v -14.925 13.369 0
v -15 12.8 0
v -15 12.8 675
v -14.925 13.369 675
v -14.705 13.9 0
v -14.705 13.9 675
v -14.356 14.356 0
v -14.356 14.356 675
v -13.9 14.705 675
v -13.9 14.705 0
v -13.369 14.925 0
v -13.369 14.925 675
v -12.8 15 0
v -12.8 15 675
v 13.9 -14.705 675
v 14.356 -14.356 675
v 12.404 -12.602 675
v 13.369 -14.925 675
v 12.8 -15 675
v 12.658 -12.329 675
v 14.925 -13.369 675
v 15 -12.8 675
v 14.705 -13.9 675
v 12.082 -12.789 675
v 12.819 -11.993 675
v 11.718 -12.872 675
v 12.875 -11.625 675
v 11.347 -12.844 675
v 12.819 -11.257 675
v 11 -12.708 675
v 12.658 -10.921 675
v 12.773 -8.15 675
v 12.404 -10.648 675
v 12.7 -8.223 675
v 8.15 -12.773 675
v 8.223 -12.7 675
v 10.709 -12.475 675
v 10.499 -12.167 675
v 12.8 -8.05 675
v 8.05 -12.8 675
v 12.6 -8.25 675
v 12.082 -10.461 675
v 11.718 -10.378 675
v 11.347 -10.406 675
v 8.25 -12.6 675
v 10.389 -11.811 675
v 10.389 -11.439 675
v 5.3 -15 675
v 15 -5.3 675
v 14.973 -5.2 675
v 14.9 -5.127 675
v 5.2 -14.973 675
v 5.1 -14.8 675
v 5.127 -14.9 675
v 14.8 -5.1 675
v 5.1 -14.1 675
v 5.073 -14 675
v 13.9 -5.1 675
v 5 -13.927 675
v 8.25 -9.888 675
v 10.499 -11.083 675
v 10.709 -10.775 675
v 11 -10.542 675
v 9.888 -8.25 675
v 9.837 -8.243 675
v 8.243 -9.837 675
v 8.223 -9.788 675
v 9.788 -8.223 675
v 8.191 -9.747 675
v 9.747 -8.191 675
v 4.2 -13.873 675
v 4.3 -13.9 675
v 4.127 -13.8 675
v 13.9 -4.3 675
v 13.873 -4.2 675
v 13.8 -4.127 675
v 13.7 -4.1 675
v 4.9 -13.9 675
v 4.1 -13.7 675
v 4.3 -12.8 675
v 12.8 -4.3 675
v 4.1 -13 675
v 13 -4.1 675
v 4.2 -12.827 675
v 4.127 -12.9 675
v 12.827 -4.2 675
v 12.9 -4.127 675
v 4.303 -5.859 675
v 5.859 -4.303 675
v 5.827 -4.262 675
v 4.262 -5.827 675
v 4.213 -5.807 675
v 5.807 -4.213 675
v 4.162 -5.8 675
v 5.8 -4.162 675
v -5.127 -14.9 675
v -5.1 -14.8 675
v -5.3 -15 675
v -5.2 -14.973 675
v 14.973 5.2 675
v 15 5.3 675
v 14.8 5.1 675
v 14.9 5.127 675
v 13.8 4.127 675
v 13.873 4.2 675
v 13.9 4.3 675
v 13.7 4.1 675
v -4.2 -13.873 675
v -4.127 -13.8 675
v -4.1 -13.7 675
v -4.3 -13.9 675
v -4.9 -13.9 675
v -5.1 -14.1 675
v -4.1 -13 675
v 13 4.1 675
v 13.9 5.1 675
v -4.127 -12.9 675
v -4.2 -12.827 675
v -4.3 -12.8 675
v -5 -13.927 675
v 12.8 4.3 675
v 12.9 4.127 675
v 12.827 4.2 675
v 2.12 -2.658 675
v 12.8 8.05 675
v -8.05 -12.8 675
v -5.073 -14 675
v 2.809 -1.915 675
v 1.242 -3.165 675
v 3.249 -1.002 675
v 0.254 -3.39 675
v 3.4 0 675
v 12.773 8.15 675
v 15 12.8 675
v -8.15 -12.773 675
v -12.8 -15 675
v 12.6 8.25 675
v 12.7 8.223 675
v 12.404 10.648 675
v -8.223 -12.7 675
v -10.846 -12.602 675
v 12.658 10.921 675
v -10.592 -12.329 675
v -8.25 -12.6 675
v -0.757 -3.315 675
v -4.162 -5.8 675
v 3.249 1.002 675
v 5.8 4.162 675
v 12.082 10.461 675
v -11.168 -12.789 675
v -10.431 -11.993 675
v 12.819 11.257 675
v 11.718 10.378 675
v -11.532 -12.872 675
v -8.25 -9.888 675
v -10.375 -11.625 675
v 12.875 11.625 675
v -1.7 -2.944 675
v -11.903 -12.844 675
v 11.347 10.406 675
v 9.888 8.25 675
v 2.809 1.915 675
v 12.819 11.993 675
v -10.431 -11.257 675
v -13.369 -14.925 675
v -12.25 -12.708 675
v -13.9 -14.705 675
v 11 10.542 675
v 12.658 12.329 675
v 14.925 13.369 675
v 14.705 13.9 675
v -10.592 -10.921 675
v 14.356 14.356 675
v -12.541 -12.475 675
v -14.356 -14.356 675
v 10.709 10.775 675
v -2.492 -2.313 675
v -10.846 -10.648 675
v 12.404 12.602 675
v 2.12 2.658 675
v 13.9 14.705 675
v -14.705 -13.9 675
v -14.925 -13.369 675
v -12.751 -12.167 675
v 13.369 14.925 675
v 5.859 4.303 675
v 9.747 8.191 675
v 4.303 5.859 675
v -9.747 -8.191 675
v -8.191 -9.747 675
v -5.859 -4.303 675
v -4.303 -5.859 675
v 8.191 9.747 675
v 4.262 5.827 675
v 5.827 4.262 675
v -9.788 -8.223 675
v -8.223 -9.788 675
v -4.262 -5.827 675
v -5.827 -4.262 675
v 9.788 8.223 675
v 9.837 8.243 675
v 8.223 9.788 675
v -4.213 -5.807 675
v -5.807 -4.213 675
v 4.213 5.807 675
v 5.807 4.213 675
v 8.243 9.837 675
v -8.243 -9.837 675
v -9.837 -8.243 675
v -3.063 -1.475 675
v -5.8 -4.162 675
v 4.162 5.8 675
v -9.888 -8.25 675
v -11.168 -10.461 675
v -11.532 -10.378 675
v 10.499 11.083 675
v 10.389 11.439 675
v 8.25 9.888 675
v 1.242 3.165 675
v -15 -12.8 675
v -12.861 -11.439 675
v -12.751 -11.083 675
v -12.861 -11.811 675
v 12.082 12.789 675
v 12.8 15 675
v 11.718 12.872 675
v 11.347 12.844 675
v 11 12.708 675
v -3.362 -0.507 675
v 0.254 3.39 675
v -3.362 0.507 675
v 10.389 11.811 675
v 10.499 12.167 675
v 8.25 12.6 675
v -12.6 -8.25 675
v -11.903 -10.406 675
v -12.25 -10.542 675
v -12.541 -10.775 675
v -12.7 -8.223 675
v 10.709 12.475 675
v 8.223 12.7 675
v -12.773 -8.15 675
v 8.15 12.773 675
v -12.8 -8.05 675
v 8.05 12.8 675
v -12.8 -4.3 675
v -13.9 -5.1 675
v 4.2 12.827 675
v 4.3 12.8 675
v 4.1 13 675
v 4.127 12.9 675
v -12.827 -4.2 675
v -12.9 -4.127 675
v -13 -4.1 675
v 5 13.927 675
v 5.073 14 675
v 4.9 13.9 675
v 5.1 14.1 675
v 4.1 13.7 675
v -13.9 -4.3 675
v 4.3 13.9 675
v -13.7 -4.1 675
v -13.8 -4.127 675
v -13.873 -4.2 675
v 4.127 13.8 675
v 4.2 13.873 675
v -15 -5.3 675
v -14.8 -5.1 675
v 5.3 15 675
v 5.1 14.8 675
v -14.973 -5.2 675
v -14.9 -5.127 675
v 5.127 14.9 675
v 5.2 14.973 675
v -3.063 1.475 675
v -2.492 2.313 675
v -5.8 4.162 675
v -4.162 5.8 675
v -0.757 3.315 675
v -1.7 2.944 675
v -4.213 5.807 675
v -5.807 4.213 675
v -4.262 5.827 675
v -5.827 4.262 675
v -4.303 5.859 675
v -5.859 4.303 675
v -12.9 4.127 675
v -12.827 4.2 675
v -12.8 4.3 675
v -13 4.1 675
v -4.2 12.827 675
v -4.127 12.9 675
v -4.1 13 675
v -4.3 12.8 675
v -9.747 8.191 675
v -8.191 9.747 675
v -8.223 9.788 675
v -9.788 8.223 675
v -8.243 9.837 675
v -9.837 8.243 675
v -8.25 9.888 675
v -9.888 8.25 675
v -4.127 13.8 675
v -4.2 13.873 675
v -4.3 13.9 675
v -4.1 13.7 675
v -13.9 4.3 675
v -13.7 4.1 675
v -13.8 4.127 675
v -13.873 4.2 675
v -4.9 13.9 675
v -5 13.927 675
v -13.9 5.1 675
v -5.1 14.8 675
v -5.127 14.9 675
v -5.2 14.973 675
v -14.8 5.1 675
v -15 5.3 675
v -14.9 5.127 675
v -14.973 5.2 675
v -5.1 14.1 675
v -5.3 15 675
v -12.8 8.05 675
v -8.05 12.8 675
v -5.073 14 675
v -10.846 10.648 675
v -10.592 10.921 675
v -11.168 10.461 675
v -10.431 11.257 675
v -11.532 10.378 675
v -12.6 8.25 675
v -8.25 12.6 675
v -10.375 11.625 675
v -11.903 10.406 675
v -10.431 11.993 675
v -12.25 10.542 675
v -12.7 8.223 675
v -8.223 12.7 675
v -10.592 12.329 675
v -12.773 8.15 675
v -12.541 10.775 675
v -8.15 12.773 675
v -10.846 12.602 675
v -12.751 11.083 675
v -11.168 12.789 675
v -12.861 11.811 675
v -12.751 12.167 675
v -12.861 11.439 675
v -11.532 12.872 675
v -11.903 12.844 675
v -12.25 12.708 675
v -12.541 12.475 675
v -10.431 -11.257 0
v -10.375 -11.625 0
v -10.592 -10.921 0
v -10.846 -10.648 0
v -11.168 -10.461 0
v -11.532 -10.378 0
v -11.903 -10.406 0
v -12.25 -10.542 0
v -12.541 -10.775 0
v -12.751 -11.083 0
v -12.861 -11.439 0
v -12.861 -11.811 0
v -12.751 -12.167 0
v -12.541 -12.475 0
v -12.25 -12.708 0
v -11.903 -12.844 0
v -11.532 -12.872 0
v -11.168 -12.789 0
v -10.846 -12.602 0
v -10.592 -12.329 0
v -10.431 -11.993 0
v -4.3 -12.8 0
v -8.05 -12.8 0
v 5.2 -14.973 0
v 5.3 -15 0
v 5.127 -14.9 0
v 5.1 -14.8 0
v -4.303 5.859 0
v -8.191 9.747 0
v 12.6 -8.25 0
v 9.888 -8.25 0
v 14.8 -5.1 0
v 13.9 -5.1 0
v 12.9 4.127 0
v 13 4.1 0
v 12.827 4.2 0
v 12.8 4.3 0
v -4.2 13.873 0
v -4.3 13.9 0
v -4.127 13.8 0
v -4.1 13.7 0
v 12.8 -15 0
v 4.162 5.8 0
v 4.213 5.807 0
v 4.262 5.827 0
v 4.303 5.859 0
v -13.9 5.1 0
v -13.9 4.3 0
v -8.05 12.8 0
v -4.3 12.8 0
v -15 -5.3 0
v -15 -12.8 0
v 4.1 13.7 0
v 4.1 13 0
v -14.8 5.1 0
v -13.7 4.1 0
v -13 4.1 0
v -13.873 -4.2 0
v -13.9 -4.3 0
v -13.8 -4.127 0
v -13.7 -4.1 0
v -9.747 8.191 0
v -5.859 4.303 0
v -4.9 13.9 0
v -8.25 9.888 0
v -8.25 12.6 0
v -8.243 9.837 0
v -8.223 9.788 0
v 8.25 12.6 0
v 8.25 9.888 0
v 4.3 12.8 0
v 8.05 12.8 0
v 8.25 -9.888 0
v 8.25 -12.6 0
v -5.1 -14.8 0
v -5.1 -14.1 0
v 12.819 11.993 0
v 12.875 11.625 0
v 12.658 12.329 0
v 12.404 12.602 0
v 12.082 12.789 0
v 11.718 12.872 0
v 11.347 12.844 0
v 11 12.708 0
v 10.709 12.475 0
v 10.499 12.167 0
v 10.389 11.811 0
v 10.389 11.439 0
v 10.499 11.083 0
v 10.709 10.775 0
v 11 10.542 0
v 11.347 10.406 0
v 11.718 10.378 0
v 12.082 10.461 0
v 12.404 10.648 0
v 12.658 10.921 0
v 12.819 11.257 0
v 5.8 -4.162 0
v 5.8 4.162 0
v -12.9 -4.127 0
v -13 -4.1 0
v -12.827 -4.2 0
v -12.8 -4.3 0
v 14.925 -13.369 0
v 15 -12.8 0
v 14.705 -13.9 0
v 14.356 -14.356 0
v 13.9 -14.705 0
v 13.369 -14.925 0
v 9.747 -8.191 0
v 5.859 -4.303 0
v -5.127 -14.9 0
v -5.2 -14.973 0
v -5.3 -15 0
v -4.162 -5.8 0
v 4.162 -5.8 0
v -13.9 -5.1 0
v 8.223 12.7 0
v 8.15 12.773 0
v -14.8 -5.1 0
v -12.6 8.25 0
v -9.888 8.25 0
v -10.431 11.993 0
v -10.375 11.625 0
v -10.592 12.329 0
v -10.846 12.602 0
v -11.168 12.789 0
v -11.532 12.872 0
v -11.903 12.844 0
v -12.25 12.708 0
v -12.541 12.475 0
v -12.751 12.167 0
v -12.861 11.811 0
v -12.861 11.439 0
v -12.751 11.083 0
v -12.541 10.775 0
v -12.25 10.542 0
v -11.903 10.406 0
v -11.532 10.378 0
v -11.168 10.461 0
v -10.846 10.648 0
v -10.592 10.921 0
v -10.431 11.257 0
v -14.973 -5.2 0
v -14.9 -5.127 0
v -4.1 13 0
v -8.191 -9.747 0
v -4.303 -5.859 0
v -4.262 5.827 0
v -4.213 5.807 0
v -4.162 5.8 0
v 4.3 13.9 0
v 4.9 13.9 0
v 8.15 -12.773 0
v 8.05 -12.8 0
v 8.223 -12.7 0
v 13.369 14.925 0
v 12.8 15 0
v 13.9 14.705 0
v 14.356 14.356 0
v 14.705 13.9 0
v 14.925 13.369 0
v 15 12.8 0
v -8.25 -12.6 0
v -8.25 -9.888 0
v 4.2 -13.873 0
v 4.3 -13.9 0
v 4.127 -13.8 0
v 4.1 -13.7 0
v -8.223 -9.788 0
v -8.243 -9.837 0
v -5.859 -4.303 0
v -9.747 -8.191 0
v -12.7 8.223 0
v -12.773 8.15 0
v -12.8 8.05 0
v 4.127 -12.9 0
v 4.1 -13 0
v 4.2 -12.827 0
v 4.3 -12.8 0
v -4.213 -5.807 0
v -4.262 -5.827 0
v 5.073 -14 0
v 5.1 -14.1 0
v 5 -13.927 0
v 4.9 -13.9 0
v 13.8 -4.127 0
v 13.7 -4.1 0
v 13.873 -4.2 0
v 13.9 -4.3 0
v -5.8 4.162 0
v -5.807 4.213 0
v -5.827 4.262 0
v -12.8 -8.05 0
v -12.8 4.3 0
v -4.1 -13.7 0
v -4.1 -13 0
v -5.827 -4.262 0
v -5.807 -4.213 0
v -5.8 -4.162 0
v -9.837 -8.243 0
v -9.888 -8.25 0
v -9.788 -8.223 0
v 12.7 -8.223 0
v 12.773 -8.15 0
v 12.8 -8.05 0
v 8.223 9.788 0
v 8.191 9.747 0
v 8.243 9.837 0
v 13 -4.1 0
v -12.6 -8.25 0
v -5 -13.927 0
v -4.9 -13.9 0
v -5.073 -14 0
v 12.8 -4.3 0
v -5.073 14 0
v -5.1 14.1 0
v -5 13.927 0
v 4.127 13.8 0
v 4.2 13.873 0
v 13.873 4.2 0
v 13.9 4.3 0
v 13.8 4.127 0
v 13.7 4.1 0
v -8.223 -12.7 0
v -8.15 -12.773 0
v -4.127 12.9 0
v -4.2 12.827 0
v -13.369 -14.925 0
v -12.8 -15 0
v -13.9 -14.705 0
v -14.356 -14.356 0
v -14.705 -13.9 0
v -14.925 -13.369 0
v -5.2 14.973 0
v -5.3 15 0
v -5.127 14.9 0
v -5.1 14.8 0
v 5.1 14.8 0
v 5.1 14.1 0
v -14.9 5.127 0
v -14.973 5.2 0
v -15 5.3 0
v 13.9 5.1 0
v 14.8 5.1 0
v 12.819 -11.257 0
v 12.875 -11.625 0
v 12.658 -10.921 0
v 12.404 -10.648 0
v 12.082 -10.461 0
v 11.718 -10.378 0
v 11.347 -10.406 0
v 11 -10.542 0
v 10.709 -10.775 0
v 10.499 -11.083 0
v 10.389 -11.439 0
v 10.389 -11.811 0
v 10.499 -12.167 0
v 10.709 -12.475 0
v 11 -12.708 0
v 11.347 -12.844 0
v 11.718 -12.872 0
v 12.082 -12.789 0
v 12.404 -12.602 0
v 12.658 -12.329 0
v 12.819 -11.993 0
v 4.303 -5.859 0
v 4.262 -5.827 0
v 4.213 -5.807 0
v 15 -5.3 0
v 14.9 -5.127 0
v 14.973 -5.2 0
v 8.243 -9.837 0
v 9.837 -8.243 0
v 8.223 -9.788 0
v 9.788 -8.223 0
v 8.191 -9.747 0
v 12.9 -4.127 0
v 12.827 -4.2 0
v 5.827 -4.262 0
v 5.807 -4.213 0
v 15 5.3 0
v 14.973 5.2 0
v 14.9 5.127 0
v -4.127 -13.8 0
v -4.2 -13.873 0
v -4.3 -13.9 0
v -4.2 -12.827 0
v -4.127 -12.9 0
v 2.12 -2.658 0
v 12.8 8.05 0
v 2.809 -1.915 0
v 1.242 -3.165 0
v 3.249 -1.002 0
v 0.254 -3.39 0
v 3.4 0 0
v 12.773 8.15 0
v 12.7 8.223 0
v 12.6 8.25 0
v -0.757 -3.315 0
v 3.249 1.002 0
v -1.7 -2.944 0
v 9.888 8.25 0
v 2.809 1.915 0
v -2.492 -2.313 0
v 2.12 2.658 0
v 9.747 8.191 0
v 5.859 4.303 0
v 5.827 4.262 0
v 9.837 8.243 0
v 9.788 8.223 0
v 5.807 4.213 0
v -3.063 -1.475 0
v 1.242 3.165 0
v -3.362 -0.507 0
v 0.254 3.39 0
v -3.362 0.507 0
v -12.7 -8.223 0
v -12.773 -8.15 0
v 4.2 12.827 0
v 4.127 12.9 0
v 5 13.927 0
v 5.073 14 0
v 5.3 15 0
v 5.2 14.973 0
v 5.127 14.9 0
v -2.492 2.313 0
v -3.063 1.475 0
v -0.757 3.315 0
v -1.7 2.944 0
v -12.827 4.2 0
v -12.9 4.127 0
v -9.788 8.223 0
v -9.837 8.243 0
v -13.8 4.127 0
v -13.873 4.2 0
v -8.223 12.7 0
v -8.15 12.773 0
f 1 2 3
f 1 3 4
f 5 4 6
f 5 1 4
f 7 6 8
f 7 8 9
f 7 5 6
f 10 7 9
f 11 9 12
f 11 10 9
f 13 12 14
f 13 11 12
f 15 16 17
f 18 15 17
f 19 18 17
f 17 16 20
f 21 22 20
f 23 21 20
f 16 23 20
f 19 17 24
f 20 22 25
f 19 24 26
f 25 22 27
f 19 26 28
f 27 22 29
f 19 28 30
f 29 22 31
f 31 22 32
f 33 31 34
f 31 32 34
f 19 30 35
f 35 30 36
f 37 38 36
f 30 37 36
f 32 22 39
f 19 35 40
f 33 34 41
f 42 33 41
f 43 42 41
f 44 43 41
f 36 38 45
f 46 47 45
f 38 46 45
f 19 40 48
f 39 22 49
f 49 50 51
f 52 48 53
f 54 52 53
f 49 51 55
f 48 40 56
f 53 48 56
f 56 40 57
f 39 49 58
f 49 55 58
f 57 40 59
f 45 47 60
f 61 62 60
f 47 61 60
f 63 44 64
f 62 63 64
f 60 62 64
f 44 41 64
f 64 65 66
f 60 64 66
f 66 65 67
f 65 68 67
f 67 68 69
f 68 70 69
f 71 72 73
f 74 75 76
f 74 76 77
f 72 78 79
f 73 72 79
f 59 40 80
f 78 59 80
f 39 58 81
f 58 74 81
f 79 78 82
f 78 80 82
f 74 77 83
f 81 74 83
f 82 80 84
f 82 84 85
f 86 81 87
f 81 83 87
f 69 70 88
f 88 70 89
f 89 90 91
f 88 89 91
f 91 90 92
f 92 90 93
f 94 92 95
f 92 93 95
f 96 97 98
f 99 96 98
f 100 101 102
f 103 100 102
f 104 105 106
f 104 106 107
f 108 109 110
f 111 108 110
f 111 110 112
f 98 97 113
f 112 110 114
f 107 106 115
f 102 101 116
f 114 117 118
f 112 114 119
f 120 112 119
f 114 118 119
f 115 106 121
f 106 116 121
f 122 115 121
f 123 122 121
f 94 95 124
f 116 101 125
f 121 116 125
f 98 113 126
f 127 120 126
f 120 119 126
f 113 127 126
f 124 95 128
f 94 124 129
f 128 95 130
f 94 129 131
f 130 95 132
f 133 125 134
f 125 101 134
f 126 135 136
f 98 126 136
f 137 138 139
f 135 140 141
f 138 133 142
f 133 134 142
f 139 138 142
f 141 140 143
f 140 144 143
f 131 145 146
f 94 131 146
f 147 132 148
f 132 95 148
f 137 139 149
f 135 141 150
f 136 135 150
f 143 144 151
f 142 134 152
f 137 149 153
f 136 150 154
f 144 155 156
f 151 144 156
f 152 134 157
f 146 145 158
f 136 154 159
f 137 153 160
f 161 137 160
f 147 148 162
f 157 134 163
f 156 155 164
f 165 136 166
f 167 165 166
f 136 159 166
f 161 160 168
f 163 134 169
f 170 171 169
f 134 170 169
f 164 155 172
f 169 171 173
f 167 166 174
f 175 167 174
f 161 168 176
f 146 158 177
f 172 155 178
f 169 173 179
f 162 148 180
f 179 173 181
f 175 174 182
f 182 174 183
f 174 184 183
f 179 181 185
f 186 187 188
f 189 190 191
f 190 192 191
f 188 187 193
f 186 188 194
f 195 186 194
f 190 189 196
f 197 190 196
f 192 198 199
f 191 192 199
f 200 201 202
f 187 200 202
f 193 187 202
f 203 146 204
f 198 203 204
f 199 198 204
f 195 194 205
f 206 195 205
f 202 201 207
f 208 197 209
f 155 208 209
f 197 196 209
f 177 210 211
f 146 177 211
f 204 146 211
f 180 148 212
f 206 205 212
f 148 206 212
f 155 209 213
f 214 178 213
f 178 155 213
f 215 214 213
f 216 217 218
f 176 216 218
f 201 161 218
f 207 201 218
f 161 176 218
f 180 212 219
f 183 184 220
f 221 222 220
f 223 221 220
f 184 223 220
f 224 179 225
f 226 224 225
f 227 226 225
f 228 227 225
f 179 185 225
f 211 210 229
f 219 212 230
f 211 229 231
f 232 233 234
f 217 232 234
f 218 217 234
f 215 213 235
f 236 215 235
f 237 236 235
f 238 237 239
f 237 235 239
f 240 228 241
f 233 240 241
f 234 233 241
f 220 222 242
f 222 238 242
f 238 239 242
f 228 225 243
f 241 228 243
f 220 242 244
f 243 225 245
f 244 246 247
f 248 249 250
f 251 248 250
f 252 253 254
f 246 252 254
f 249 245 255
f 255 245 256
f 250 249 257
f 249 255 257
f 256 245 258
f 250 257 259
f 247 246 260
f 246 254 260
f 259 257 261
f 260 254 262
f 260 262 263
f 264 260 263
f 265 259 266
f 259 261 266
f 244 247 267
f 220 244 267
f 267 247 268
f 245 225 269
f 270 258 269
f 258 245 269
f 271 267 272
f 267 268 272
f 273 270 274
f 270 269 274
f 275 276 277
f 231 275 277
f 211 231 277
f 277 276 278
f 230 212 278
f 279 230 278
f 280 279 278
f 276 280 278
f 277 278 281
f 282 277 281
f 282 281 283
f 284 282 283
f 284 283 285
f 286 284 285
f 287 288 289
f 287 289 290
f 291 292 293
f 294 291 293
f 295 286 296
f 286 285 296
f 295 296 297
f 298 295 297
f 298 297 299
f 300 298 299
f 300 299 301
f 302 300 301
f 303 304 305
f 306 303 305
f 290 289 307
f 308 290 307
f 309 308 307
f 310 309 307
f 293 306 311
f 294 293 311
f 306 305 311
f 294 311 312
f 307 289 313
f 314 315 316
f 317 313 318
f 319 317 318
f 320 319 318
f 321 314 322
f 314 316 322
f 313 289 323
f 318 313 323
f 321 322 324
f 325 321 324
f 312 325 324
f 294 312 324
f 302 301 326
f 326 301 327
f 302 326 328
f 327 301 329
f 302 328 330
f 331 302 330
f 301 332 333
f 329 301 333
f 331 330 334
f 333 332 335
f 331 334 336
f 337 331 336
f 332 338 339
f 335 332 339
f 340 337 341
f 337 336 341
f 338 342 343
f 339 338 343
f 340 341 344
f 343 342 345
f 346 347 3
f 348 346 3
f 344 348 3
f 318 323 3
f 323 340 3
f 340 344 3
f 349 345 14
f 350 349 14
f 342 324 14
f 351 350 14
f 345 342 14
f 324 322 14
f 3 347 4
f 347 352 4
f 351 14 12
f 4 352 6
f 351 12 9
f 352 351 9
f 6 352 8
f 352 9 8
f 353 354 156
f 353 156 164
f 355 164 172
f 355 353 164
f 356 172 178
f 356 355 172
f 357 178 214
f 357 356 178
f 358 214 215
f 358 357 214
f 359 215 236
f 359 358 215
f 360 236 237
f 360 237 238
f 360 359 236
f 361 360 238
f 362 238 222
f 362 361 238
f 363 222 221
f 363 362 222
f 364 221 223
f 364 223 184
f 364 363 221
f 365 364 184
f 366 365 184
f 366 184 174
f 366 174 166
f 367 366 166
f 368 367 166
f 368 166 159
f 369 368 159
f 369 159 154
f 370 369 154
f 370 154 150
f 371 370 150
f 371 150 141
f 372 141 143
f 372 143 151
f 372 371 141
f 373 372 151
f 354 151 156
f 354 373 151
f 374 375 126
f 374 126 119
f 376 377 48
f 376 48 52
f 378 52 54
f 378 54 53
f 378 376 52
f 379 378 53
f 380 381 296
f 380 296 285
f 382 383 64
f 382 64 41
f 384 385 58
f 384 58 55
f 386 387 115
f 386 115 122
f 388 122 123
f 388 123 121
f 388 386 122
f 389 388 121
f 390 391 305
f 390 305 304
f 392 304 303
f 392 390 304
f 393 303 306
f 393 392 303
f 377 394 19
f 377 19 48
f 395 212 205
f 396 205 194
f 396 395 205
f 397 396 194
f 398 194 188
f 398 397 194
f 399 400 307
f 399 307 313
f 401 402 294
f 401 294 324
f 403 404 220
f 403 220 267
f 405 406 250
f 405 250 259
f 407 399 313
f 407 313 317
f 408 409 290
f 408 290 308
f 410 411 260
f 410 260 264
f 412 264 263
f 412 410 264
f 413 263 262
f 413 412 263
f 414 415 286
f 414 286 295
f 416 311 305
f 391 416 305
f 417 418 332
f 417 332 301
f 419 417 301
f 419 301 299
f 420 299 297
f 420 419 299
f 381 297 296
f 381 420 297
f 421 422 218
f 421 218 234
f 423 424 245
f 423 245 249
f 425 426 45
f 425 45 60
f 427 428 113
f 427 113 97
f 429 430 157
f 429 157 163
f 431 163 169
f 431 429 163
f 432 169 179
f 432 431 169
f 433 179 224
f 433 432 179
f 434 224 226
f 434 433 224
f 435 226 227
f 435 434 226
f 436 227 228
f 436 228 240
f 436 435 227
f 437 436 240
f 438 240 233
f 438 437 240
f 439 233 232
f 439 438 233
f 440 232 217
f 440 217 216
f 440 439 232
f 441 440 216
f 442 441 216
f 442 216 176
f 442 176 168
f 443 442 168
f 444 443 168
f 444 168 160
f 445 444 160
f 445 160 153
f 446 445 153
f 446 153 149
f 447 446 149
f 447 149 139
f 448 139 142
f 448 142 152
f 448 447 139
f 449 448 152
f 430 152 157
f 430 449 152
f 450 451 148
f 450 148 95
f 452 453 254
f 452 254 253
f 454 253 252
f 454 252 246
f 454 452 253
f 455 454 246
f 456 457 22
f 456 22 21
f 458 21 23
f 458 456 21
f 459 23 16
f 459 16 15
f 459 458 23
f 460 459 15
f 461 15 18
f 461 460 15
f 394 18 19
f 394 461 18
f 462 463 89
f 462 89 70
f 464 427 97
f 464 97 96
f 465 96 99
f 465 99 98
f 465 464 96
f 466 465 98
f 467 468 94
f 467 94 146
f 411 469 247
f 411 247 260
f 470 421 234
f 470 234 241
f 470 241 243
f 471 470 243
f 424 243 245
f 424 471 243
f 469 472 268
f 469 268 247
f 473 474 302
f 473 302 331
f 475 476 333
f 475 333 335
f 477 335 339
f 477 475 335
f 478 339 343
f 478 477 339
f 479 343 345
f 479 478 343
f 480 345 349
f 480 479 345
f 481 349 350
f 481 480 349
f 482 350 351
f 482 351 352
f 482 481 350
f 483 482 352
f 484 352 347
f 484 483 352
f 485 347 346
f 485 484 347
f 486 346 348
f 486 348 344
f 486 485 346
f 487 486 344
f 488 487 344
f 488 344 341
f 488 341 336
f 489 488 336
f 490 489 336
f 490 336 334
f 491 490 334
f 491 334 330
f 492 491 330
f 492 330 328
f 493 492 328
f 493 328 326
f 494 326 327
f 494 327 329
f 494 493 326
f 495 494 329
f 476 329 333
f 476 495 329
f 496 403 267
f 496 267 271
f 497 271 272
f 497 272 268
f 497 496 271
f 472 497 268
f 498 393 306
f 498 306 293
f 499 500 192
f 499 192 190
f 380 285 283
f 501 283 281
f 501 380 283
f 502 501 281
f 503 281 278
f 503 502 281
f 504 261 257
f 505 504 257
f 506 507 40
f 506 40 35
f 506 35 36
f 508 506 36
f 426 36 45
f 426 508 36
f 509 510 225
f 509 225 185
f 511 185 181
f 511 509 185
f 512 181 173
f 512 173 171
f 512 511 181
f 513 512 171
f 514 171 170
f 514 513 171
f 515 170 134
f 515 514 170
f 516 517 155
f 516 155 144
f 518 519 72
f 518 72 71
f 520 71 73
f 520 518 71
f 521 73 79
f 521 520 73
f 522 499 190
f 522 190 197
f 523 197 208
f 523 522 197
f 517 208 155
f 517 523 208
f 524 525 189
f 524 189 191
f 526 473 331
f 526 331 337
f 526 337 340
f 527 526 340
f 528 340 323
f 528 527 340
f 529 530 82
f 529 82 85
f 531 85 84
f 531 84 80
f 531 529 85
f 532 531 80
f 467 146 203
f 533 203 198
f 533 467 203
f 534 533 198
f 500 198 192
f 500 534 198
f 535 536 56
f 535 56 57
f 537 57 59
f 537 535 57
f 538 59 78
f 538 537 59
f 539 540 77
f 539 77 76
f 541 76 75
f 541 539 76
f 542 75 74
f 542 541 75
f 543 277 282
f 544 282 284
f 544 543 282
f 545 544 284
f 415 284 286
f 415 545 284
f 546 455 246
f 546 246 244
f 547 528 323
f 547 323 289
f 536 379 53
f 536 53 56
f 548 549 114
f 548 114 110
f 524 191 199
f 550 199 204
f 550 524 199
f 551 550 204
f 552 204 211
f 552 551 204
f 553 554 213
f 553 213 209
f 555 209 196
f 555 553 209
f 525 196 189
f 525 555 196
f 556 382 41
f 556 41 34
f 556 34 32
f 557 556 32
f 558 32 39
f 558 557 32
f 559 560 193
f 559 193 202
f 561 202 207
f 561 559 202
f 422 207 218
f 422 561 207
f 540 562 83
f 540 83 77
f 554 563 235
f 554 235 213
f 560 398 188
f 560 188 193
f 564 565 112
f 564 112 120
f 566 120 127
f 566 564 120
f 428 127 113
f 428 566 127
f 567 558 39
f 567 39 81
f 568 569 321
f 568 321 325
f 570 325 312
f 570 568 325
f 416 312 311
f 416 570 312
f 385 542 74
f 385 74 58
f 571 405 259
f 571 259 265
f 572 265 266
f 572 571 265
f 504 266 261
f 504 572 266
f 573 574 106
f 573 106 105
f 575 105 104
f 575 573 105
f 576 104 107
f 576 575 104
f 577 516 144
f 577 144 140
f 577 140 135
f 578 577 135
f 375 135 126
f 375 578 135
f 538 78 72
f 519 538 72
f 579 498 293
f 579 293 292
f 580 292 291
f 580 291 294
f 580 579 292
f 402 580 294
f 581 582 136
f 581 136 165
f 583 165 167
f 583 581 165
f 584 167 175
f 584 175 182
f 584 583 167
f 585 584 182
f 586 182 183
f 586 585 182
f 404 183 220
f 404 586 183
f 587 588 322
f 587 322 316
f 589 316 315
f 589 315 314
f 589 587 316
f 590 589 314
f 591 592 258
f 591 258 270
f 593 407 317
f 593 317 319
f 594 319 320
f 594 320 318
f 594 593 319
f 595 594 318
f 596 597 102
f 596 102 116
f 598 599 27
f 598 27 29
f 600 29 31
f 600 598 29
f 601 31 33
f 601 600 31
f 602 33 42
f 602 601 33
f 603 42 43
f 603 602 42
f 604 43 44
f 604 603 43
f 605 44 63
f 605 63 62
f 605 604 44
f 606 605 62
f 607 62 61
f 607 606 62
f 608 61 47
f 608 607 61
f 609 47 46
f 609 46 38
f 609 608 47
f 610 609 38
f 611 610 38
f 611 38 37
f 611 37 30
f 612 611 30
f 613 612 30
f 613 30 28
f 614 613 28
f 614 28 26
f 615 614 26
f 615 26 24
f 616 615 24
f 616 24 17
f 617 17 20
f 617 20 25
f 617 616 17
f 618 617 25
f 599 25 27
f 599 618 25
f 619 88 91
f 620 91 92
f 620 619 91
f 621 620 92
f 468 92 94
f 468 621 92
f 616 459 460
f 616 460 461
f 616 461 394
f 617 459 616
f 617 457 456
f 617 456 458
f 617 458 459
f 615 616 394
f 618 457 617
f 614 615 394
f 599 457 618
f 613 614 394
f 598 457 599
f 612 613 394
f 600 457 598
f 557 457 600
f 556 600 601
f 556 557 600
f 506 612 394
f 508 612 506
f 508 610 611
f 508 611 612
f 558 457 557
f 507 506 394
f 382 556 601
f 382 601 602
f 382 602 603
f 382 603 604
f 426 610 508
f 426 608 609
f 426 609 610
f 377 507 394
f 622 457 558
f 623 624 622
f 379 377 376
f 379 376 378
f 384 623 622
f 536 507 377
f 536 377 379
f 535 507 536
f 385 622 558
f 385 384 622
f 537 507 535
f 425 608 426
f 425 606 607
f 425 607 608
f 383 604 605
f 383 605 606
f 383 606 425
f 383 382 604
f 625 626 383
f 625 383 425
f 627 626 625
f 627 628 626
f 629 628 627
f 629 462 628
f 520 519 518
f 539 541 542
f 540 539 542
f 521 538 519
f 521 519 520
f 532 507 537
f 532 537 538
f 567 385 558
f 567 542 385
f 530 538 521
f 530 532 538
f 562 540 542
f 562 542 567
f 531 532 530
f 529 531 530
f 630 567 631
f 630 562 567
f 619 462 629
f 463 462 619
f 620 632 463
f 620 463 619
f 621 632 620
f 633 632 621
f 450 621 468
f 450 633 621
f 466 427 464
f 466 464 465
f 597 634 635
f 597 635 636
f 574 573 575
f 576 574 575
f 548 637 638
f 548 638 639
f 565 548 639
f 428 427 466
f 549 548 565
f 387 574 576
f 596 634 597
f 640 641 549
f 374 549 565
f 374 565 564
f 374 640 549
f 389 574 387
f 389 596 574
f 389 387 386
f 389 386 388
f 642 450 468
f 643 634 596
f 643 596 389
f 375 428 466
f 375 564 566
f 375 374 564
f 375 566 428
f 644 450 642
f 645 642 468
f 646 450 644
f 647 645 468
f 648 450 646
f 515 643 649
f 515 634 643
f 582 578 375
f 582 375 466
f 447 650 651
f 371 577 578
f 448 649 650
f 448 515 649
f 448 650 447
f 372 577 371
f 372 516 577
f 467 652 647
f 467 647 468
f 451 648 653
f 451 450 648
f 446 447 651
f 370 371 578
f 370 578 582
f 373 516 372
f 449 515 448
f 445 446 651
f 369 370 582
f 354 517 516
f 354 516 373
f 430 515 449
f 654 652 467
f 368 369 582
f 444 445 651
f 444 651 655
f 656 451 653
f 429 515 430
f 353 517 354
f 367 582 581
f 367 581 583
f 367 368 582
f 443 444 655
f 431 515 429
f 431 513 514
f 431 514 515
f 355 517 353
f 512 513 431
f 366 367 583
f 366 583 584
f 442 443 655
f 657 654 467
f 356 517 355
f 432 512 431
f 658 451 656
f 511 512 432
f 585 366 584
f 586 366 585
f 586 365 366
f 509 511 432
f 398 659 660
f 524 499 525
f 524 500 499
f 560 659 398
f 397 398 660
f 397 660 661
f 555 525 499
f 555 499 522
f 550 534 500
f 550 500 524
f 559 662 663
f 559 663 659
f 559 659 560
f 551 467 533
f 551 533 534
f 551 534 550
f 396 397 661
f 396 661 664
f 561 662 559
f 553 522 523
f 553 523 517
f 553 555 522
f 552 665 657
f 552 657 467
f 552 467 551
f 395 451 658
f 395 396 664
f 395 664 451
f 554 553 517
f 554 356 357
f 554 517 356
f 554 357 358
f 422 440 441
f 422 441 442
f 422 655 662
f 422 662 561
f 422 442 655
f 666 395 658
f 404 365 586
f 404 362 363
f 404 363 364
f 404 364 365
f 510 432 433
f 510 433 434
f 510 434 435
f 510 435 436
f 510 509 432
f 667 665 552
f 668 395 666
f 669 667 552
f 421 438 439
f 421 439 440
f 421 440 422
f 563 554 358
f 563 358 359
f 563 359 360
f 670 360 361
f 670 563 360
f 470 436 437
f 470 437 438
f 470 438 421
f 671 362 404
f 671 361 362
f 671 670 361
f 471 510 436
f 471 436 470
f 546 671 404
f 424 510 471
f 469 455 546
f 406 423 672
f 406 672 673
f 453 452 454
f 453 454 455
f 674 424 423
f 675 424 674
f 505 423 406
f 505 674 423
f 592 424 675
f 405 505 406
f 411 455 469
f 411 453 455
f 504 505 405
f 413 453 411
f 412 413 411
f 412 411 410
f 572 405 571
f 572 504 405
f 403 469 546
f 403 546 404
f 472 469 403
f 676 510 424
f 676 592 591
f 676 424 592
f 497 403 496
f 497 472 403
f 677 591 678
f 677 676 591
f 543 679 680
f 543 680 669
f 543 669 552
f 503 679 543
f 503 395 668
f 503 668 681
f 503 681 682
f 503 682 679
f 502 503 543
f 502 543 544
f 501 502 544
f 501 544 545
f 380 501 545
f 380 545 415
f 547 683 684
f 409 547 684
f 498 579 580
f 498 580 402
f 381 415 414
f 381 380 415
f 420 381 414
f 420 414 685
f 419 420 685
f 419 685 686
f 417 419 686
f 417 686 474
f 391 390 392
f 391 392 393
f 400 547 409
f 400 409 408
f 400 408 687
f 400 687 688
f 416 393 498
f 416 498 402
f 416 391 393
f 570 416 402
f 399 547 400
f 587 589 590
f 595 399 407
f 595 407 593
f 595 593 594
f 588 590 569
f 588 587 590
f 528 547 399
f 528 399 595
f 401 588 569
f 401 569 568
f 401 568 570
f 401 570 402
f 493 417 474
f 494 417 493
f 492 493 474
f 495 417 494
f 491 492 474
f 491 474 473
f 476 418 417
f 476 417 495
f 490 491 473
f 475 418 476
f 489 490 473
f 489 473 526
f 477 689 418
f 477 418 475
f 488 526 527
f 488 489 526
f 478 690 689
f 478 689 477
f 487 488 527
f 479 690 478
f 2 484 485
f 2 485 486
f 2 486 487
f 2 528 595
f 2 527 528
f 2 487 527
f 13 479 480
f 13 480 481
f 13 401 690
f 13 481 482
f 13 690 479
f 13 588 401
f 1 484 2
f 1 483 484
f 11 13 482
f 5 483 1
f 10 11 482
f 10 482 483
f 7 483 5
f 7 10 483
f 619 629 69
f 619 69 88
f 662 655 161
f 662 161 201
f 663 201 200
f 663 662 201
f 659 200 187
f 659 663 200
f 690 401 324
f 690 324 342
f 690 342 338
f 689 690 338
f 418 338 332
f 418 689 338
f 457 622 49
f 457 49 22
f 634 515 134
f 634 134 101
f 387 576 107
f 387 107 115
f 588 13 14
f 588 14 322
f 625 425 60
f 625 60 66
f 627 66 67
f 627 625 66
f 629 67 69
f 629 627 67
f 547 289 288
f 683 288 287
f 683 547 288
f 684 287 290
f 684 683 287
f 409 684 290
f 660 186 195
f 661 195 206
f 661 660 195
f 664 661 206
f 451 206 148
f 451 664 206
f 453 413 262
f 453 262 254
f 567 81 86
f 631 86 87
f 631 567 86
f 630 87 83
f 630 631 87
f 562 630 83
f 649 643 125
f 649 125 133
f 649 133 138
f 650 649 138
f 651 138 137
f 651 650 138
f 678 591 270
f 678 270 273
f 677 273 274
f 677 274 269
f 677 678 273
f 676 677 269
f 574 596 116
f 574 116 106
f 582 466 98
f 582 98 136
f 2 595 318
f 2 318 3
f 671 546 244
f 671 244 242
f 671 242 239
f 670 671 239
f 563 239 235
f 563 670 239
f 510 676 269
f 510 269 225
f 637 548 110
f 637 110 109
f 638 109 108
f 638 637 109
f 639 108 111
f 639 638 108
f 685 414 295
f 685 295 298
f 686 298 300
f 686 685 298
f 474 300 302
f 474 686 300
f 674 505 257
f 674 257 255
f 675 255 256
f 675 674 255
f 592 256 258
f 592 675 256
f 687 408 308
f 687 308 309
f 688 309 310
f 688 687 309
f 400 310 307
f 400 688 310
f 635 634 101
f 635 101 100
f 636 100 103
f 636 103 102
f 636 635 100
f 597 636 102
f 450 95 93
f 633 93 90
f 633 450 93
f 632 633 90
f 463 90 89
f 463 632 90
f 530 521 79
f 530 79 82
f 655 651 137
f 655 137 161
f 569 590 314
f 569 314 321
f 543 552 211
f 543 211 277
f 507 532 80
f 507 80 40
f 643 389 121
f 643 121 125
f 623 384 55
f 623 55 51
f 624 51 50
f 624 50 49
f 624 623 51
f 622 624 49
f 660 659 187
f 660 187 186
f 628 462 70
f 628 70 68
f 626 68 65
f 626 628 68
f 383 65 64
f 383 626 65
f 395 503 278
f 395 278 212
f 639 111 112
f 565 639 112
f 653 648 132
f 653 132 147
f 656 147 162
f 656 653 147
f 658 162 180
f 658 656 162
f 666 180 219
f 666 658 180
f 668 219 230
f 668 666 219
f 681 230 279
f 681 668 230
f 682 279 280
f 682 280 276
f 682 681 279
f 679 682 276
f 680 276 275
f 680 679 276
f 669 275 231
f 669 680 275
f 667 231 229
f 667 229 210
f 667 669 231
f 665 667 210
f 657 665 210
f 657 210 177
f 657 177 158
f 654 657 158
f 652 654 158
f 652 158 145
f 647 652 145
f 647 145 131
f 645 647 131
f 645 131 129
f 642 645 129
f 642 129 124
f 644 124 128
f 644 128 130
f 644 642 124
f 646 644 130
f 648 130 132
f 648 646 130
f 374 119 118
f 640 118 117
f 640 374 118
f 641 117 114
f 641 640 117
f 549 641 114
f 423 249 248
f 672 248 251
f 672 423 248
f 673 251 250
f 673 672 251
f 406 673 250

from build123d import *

# Parameters (mm, degrees)
CROQUIS1_R              = 1.25
CROQUIS1_R_2            = 3.4
SALIENTE_EXTRUIR1_DEPTH = 675


with BuildPart() as part:
    # Croquis1 → Saliente-Extruir1 (new body)
    with BuildSketch(Plane.XY):
        with BuildLine():
            Line((-4.161522369, 5.8), (4.161522369, 5.8))
            ThreePointArc((4.161522369, 5.8), (4.238059055, 5.815224093), (4.302943725, 5.858578644))
            Line((4.302943725, 5.858578644), (8.191421356, 9.747056275))
            ThreePointArc((8.191421356, 9.747056275), (8.234775907, 9.811940945), (8.25, 9.888477631))
            Line((8.25, 9.888477631), (8.25, 12.6))
            ThreePointArc((8.25, 12.6), (8.191421356, 12.741421356), (8.05, 12.8))
            Line((8.05, 12.8), (4.3, 12.8))
            ThreePointArc((4.3, 12.8), (4.158578644, 12.858578644), (4.1, 13))
            Line((4.1, 13), (4.1, 13.7))
            ThreePointArc((4.1, 13.7), (4.158578644, 13.841421356), (4.3, 13.9))
            Line((4.3, 13.9), (4.9, 13.9))
            ThreePointArc((4.9, 13.9), (5.041421356, 13.958578644), (5.1, 14.1))
            Line((5.1, 14.1), (5.1, 14.8))
            ThreePointArc((5.1, 14.8), (5.158578644, 14.941421356), (5.3, 15))
            Line((5.3, 15), (12.8, 15))
            ThreePointArc((12.8, 15), (14.355634919, 14.355634919), (15, 12.8))
            Line((15, 12.8), (15, 5.3))
            ThreePointArc((15, 5.3), (14.941421356, 5.158578644), (14.8, 5.1))
            Line((14.8, 5.1), (13.9, 5.1))
            Line((13.9, 5.1), (13.9, 4.3))
            ThreePointArc((13.9, 4.3), (13.841421356, 4.158578644), (13.7, 4.1))
            Line((13.7, 4.1), (13, 4.1))
            ThreePointArc((13, 4.1), (12.858578644, 4.158578644), (12.8, 4.3))
            Line((12.8, 4.3), (12.8, 8.05))
            ThreePointArc((12.8, 8.05), (12.741421356, 8.191421356), (12.6, 8.25))
            Line((12.6, 8.25), (9.888477631, 8.25))
            ThreePointArc((9.888477631, 8.25), (9.811940945, 8.234775907), (9.747056275, 8.191421356))
            Line((9.747056275, 8.191421356), (5.858578644, 4.302943725))
            ThreePointArc((5.858578644, 4.302943725), (5.815224093, 4.238059055), (5.8, 4.161522369))
            Line((5.8, 4.161522369), (5.8, -4.161522369))
            ThreePointArc((5.8, -4.161522369), (5.815224093, -4.238059055), (5.858578644, -4.302943725))
            Line((5.858578644, -4.302943725), (9.747056275, -8.191421356))
            ThreePointArc((9.747056275, -8.191421356), (9.811940945, -8.234775907), (9.888477631, -8.25))
            Line((9.888477631, -8.25), (12.6, -8.25))
            ThreePointArc((12.6, -8.25), (12.741421356, -8.191421356), (12.8, -8.05))
            Line((12.8, -8.05), (12.8, -4.3))
            ThreePointArc((12.8, -4.3), (12.858578644, -4.158578644), (13, -4.1))
            Line((13, -4.1), (13.7, -4.1))
            ThreePointArc((13.7, -4.1), (13.841421356, -4.158578644), (13.9, -4.3))
            Line((13.9, -4.3), (13.9, -5.1))
            Line((13.9, -5.1), (14.8, -5.1))
            ThreePointArc((14.8, -5.1), (14.941421356, -5.158578644), (15, -5.3))
            Line((15, -5.3), (15, -12.8))
            ThreePointArc((15, -12.8), (14.355634919, -14.355634919), (12.8, -15))
            Line((12.8, -15), (5.3, -15))
            ThreePointArc((5.3, -15), (5.158578644, -14.941421356), (5.1, -14.8))
            Line((5.1, -14.8), (5.1, -14.1))
            ThreePointArc((5.1, -14.1), (5.041421356, -13.958578644), (4.9, -13.9))
            Line((4.9, -13.9), (4.3, -13.9))
            ThreePointArc((4.3, -13.9), (4.158578644, -13.841421356), (4.1, -13.7))
            Line((4.1, -13.7), (4.1, -13))
            ThreePointArc((4.1, -13), (4.158578644, -12.858578644), (4.3, -12.8))
            Line((4.3, -12.8), (8.05, -12.8))
            ThreePointArc((8.05, -12.8), (8.191421356, -12.741421356), (8.25, -12.6))
            Line((8.25, -12.6), (8.25, -9.888477631))
            ThreePointArc((8.25, -9.888477631), (8.234775907, -9.811940945), (8.191421356, -9.747056275))
            Line((8.191421356, -9.747056275), (4.302943725, -5.858578644))
            ThreePointArc((4.302943725, -5.858578644), (4.238059055, -5.815224093), (4.161522369, -5.8))
            Line((4.161522369, -5.8), (-4.161522369, -5.8))
            ThreePointArc((-4.161522369, -5.8), (-4.238059055, -5.815224093), (-4.302943725, -5.858578644))
            Line((-4.302943725, -5.858578644), (-8.191421356, -9.747056275))
            ThreePointArc((-8.191421356, -9.747056275), (-8.234775907, -9.811940945), (-8.25, -9.888477631))
            Line((-8.25, -9.888477631), (-8.25, -12.6))
            ThreePointArc((-8.25, -12.6), (-8.191421356, -12.741421356), (-8.05, -12.8))
            Line((-8.05, -12.8), (-4.3, -12.8))
            ThreePointArc((-4.3, -12.8), (-4.158578644, -12.858578644), (-4.1, -13))
            Line((-4.1, -13), (-4.1, -13.7))
            ThreePointArc((-4.1, -13.7), (-4.158578644, -13.841421356), (-4.3, -13.9))
            Line((-4.3, -13.9), (-4.9, -13.9))
            ThreePointArc((-4.9, -13.9), (-5.041421356, -13.958578644), (-5.1, -14.1))
            Line((-5.1, -14.1), (-5.1, -14.8))
            ThreePointArc((-5.1, -14.8), (-5.158578644, -14.941421356), (-5.3, -15))
            Line((-5.3, -15), (-12.8, -15))
            ThreePointArc((-12.8, -15), (-14.355634919, -14.355634919), (-15, -12.8))
            Line((-15, -12.8), (-15, -5.3))
            ThreePointArc((-15, -5.3), (-14.941421356, -5.158578644), (-14.8, -5.1))
            Line((-14.8, -5.1), (-13.9, -5.1))
            Line((-13.9, -5.1), (-13.9, -4.3))
            ThreePointArc((-13.9, -4.3), (-13.841421356, -4.158578644), (-13.7, -4.1))
            Line((-13.7, -4.1), (-13, -4.1))
            ThreePointArc((-13, -4.1), (-12.858578644, -4.158578644), (-12.8, -4.3))
            Line((-12.8, -4.3), (-12.8, -8.05))
            ThreePointArc((-12.8, -8.05), (-12.741421356, -8.191421356), (-12.6, -8.25))
            Line((-12.6, -8.25), (-9.888477631, -8.25))
            ThreePointArc((-9.888477631, -8.25), (-9.811940945, -8.234775907), (-9.747056275, -8.191421356))
            Line((-9.747056275, -8.191421356), (-5.858578644, -4.302943725))
            ThreePointArc((-5.858578644, -4.302943725), (-5.815224093, -4.238059055), (-5.8, -4.161522369))
            Line((-5.8, -4.161522369), (-5.8, 4.161522369))
            ThreePointArc((-5.8, 4.161522369), (-5.815224093, 4.238059055), (-5.858578644, 4.302943725))
            Line((-5.858578644, 4.302943725), (-9.747056275, 8.191421356))
            ThreePointArc((-9.747056275, 8.191421356), (-9.811940945, 8.234775907), (-9.888477631, 8.25))
            Line((-9.888477631, 8.25), (-12.6, 8.25))
            ThreePointArc((-12.6, 8.25), (-12.741421356, 8.191421356), (-12.8, 8.05))
            Line((-12.8, 8.05), (-12.8, 4.3))
            ThreePointArc((-12.8, 4.3), (-12.858578644, 4.158578644), (-13, 4.1))
            Line((-13, 4.1), (-13.7, 4.1))
            ThreePointArc((-13.7, 4.1), (-13.841421356, 4.158578644), (-13.9, 4.3))
            Line((-13.9, 4.3), (-13.9, 5.1))
            Line((-13.9, 5.1), (-14.8, 5.1))
            ThreePointArc((-14.8, 5.1), (-14.941421356, 5.158578644), (-15, 5.3))
            Line((-15, 5.3), (-15, 12.8))
            ThreePointArc((-15, 12.8), (-14.355634919, 14.355634919), (-12.8, 15))
            Line((-12.8, 15), (-5.3, 15))
            ThreePointArc((-5.3, 15), (-5.158578644, 14.941421356), (-5.1, 14.8))
            Line((-5.1, 14.8), (-5.1, 14.1))
            ThreePointArc((-5.1, 14.1), (-5.041421356, 13.958578644), (-4.9, 13.9))
            Line((-4.9, 13.9), (-4.3, 13.9))
            ThreePointArc((-4.3, 13.9), (-4.158578644, 13.841421356), (-4.1, 13.7))
            Line((-4.1, 13.7), (-4.1, 13))
            ThreePointArc((-4.1, 13), (-4.158578644, 12.858578644), (-4.3, 12.8))
            Line((-4.3, 12.8), (-8.05, 12.8))
            ThreePointArc((-8.05, 12.8), (-8.191421356, 12.741421356), (-8.25, 12.6))
            Line((-8.25, 12.6), (-8.25, 9.888477631))
            ThreePointArc((-8.25, 9.888477631), (-8.234775907, 9.811940945), (-8.191421356, 9.747056275))
            Line((-8.191421356, 9.747056275), (-4.302943725, 5.858578644))
            ThreePointArc((-4.302943725, 5.858578644), (-4.238059055, 5.815224093), (-4.161522369, 5.8))
        make_face()
        with Locations((11.625, 11.625)):
            Circle(CROQUIS1_R, mode=Mode.SUBTRACT)
        with Locations((11.625, -11.625)):
            Circle(CROQUIS1_R, mode=Mode.SUBTRACT)
        with Locations((-11.625, -11.625)):
            Circle(CROQUIS1_R, mode=Mode.SUBTRACT)
        with Locations((-11.625, 11.625)):
            Circle(CROQUIS1_R, mode=Mode.SUBTRACT)
        Circle(CROQUIS1_R_2, mode=Mode.SUBTRACT)
    extrude(amount=SALIENTE_EXTRUIR1_DEPTH)


solid = part.part
